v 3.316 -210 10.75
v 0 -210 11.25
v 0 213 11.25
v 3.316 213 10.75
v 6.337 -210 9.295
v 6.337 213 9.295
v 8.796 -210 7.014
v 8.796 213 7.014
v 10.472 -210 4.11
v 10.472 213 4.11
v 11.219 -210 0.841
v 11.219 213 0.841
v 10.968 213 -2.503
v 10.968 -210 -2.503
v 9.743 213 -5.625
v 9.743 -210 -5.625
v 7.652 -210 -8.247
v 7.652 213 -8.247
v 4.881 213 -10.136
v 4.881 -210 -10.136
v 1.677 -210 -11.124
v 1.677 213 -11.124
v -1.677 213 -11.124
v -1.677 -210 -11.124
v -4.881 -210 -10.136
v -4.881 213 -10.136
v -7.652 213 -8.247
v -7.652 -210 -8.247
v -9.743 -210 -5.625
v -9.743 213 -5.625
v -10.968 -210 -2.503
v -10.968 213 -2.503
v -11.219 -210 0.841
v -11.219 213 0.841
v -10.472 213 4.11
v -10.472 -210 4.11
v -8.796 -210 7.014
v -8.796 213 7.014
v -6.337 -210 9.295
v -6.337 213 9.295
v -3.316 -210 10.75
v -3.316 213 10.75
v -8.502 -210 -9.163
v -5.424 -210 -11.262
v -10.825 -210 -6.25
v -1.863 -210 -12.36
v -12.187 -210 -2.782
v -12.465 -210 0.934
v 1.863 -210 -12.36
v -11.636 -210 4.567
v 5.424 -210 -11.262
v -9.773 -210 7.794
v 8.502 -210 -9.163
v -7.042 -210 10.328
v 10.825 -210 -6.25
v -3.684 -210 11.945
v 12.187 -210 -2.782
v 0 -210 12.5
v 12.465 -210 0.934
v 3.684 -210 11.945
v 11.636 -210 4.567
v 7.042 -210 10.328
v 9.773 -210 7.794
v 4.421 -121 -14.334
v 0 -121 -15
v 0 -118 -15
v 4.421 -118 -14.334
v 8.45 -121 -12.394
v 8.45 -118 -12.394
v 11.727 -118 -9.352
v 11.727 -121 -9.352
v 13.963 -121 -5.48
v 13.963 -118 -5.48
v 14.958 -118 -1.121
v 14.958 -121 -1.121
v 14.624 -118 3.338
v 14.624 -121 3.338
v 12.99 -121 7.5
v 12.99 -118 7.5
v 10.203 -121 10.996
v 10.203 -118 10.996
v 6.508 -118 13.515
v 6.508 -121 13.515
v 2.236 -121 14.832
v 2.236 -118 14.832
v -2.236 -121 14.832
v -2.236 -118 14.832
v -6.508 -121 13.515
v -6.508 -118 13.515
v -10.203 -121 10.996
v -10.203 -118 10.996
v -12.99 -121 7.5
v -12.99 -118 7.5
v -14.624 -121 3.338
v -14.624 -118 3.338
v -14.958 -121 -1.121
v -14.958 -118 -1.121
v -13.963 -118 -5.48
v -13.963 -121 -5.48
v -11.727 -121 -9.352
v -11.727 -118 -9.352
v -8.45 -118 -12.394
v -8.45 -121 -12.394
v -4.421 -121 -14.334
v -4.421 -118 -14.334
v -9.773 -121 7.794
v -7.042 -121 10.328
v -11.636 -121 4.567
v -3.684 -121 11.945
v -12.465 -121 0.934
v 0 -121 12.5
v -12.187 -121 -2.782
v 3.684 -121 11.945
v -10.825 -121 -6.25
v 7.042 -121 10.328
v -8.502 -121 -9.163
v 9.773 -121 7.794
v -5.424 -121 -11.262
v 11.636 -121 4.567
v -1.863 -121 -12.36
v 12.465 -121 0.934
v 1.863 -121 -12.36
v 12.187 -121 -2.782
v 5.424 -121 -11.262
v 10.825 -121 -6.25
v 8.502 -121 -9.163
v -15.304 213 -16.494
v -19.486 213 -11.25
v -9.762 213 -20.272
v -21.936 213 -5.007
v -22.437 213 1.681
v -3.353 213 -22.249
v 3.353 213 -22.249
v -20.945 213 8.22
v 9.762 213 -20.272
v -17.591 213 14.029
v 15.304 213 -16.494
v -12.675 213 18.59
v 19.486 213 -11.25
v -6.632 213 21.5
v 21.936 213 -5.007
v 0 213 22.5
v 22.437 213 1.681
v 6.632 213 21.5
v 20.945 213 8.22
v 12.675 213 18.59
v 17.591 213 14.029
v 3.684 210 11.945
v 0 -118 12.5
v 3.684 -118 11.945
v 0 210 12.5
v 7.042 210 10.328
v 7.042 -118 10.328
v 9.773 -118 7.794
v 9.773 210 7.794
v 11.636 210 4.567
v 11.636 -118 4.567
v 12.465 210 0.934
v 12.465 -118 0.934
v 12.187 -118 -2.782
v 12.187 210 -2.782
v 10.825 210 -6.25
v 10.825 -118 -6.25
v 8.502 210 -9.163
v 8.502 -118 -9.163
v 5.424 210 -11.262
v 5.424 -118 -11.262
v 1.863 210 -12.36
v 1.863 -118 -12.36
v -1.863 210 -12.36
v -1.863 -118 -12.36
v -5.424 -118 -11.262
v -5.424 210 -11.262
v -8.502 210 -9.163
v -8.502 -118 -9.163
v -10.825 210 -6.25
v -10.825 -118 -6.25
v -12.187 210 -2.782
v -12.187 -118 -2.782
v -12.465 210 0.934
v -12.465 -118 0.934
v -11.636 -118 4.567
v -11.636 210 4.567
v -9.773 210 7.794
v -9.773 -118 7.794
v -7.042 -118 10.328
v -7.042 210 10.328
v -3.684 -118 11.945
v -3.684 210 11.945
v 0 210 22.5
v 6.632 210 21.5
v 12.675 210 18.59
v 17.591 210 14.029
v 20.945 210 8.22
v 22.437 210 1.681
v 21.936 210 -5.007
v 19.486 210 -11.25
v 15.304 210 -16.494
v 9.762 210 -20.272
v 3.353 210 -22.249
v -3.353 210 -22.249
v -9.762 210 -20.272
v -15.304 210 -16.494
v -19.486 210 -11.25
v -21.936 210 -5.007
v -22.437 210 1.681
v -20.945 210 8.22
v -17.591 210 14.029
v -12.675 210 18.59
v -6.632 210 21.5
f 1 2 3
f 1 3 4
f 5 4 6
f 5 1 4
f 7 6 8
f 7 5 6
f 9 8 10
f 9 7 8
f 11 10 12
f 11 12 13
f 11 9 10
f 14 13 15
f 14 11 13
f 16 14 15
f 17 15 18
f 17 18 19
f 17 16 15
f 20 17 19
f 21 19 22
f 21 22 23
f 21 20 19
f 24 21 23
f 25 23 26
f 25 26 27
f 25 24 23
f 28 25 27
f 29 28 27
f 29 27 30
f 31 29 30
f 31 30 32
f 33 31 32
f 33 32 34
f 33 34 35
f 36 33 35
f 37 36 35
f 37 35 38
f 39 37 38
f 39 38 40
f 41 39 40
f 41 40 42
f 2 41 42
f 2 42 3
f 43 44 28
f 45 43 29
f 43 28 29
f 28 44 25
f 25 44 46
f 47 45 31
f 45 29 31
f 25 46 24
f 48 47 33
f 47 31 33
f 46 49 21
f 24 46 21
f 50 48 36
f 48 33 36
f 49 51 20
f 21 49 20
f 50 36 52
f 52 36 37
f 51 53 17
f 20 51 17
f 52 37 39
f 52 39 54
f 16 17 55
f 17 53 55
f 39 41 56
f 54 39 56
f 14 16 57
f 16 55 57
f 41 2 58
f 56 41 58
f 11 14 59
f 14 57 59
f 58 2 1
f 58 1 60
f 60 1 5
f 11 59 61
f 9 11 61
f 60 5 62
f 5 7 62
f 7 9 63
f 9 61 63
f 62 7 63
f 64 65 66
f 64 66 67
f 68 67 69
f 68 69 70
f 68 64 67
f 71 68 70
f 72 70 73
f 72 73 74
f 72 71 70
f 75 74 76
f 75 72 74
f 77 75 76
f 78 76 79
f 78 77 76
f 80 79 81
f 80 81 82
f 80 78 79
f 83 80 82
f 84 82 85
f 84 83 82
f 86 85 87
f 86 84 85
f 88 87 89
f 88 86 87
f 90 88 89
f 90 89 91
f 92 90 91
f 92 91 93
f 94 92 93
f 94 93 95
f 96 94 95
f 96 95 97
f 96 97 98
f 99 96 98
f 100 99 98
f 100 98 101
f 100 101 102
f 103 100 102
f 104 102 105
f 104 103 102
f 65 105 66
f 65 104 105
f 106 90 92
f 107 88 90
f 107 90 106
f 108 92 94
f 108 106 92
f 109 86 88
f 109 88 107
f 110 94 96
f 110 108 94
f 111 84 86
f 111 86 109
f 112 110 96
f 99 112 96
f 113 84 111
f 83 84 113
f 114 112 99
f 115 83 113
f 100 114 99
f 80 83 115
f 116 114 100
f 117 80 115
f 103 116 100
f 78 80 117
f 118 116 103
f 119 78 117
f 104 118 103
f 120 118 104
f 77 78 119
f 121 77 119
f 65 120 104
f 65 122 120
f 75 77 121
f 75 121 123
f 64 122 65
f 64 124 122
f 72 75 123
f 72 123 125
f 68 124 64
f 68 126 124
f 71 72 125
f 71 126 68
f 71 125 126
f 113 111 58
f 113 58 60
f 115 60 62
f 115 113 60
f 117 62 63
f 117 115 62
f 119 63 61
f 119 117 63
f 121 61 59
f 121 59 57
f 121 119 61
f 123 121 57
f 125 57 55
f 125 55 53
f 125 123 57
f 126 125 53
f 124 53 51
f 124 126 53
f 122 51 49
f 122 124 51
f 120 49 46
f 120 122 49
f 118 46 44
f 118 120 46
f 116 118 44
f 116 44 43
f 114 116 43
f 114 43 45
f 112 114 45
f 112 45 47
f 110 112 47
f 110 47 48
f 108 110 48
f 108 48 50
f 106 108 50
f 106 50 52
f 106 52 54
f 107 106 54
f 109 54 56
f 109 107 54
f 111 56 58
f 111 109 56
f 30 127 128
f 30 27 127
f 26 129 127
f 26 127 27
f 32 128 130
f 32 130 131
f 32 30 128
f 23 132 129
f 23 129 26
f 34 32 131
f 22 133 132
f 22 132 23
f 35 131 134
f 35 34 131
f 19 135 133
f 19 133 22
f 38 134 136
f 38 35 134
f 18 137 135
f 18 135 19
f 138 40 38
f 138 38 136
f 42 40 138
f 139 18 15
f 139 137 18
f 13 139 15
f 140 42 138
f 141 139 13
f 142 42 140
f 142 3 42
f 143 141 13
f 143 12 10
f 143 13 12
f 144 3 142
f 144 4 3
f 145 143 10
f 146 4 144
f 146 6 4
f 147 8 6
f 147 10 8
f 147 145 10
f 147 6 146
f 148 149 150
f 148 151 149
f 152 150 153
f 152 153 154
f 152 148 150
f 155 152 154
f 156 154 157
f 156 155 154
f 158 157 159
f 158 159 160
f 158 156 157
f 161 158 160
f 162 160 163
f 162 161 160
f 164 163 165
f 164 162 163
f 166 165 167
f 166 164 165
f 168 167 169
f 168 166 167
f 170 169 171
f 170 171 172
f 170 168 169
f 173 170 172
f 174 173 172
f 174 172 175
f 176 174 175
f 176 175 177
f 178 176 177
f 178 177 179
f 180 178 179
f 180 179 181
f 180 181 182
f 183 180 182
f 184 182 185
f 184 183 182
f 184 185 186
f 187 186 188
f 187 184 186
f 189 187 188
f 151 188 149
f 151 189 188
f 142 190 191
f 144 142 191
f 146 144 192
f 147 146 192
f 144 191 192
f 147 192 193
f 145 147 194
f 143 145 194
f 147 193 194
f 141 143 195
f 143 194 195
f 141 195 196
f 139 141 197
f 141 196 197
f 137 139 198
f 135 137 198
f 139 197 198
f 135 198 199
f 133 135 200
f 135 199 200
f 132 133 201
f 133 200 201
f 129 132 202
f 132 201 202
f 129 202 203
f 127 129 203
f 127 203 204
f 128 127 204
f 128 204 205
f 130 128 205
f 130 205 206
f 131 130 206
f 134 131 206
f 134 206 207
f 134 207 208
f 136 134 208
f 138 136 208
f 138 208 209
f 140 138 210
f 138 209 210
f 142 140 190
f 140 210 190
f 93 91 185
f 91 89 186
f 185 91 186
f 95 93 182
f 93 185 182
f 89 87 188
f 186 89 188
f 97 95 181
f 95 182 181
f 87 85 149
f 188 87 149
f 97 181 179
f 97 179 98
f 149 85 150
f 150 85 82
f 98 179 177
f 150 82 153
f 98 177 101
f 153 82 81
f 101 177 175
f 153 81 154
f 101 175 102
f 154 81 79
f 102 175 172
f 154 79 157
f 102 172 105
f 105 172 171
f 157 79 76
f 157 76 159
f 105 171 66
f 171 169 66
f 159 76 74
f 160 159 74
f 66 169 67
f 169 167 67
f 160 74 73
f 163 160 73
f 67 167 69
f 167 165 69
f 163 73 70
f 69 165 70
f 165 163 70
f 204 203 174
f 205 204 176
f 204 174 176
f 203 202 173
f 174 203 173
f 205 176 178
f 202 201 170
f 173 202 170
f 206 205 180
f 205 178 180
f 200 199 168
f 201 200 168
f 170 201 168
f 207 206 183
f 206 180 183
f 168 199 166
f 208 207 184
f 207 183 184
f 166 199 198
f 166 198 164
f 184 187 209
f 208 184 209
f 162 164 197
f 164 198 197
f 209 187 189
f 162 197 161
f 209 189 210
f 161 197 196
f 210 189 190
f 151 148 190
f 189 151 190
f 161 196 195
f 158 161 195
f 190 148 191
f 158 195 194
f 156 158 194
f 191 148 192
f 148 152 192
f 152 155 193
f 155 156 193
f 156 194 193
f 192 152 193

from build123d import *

# Parameters (mm, degrees)
SKETCH1_R           = 12.5
SKETCH1_R_2         = 11.25
BOSS_EXTRUDE1_DEPTH = 210
SKETCH2_R           = 22.5
SKETCH2_R_2         = 11.25
BOSS_EXTRUDE2_DEPTH = 3
BOSS_EXTRUDE3_START = 3
SKETCH3_R           = 15
SKETCH3_R_2         = 11.25
BOSS_EXTRUDE3_DEPTH = 3


with BuildPart() as part:
    # Sketch1 → Boss-Extrude1 (new, symmetric)
    with BuildSketch(Plane(origin=(0, 0, 0), x_dir=(1, 0, 0), z_dir=(0, 1, 0))):
        with Locations(Location((0, 0, 0), (0, 0, 270))):
            Circle(SKETCH1_R)
        with Locations(Location((0, 0, 0), (0, 0, 270))):
            Circle(SKETCH1_R_2, mode=Mode.SUBTRACT)
    extrude(amount=BOSS_EXTRUDE1_DEPTH, both=True)

    # Sketch2 → Boss-Extrude2 (add)
    with BuildSketch(Plane(origin=(0, 210, 0), x_dir=(1, 0, 0), z_dir=(0, 1, 0))):
        with Locations(Location((0, 0, 0), (0, 0, 270))):
            Circle(SKETCH2_R)
        with Locations(Location((0, 0, 0), (0, 0, 270))):
            Circle(SKETCH2_R_2, mode=Mode.SUBTRACT)
    extrude(amount=BOSS_EXTRUDE2_DEPTH)

    # Sketch3 → Boss-Extrude3 (add)
    with BuildSketch(Plane(origin=(0, -118, 0), x_dir=(-1, 0, 0), z_dir=(0, -1, 0)).offset(BOSS_EXTRUDE3_START)):
        with Locations(Location((0, 0, 0), (0, 0, 90))):
            Circle(SKETCH3_R)
        with Locations(Location((0, 0, 0), (0, 0, 270))):
            Circle(SKETCH3_R_2, mode=Mode.SUBTRACT)
    extrude(amount=-BOSS_EXTRUDE3_DEPTH)


solid = part.part
